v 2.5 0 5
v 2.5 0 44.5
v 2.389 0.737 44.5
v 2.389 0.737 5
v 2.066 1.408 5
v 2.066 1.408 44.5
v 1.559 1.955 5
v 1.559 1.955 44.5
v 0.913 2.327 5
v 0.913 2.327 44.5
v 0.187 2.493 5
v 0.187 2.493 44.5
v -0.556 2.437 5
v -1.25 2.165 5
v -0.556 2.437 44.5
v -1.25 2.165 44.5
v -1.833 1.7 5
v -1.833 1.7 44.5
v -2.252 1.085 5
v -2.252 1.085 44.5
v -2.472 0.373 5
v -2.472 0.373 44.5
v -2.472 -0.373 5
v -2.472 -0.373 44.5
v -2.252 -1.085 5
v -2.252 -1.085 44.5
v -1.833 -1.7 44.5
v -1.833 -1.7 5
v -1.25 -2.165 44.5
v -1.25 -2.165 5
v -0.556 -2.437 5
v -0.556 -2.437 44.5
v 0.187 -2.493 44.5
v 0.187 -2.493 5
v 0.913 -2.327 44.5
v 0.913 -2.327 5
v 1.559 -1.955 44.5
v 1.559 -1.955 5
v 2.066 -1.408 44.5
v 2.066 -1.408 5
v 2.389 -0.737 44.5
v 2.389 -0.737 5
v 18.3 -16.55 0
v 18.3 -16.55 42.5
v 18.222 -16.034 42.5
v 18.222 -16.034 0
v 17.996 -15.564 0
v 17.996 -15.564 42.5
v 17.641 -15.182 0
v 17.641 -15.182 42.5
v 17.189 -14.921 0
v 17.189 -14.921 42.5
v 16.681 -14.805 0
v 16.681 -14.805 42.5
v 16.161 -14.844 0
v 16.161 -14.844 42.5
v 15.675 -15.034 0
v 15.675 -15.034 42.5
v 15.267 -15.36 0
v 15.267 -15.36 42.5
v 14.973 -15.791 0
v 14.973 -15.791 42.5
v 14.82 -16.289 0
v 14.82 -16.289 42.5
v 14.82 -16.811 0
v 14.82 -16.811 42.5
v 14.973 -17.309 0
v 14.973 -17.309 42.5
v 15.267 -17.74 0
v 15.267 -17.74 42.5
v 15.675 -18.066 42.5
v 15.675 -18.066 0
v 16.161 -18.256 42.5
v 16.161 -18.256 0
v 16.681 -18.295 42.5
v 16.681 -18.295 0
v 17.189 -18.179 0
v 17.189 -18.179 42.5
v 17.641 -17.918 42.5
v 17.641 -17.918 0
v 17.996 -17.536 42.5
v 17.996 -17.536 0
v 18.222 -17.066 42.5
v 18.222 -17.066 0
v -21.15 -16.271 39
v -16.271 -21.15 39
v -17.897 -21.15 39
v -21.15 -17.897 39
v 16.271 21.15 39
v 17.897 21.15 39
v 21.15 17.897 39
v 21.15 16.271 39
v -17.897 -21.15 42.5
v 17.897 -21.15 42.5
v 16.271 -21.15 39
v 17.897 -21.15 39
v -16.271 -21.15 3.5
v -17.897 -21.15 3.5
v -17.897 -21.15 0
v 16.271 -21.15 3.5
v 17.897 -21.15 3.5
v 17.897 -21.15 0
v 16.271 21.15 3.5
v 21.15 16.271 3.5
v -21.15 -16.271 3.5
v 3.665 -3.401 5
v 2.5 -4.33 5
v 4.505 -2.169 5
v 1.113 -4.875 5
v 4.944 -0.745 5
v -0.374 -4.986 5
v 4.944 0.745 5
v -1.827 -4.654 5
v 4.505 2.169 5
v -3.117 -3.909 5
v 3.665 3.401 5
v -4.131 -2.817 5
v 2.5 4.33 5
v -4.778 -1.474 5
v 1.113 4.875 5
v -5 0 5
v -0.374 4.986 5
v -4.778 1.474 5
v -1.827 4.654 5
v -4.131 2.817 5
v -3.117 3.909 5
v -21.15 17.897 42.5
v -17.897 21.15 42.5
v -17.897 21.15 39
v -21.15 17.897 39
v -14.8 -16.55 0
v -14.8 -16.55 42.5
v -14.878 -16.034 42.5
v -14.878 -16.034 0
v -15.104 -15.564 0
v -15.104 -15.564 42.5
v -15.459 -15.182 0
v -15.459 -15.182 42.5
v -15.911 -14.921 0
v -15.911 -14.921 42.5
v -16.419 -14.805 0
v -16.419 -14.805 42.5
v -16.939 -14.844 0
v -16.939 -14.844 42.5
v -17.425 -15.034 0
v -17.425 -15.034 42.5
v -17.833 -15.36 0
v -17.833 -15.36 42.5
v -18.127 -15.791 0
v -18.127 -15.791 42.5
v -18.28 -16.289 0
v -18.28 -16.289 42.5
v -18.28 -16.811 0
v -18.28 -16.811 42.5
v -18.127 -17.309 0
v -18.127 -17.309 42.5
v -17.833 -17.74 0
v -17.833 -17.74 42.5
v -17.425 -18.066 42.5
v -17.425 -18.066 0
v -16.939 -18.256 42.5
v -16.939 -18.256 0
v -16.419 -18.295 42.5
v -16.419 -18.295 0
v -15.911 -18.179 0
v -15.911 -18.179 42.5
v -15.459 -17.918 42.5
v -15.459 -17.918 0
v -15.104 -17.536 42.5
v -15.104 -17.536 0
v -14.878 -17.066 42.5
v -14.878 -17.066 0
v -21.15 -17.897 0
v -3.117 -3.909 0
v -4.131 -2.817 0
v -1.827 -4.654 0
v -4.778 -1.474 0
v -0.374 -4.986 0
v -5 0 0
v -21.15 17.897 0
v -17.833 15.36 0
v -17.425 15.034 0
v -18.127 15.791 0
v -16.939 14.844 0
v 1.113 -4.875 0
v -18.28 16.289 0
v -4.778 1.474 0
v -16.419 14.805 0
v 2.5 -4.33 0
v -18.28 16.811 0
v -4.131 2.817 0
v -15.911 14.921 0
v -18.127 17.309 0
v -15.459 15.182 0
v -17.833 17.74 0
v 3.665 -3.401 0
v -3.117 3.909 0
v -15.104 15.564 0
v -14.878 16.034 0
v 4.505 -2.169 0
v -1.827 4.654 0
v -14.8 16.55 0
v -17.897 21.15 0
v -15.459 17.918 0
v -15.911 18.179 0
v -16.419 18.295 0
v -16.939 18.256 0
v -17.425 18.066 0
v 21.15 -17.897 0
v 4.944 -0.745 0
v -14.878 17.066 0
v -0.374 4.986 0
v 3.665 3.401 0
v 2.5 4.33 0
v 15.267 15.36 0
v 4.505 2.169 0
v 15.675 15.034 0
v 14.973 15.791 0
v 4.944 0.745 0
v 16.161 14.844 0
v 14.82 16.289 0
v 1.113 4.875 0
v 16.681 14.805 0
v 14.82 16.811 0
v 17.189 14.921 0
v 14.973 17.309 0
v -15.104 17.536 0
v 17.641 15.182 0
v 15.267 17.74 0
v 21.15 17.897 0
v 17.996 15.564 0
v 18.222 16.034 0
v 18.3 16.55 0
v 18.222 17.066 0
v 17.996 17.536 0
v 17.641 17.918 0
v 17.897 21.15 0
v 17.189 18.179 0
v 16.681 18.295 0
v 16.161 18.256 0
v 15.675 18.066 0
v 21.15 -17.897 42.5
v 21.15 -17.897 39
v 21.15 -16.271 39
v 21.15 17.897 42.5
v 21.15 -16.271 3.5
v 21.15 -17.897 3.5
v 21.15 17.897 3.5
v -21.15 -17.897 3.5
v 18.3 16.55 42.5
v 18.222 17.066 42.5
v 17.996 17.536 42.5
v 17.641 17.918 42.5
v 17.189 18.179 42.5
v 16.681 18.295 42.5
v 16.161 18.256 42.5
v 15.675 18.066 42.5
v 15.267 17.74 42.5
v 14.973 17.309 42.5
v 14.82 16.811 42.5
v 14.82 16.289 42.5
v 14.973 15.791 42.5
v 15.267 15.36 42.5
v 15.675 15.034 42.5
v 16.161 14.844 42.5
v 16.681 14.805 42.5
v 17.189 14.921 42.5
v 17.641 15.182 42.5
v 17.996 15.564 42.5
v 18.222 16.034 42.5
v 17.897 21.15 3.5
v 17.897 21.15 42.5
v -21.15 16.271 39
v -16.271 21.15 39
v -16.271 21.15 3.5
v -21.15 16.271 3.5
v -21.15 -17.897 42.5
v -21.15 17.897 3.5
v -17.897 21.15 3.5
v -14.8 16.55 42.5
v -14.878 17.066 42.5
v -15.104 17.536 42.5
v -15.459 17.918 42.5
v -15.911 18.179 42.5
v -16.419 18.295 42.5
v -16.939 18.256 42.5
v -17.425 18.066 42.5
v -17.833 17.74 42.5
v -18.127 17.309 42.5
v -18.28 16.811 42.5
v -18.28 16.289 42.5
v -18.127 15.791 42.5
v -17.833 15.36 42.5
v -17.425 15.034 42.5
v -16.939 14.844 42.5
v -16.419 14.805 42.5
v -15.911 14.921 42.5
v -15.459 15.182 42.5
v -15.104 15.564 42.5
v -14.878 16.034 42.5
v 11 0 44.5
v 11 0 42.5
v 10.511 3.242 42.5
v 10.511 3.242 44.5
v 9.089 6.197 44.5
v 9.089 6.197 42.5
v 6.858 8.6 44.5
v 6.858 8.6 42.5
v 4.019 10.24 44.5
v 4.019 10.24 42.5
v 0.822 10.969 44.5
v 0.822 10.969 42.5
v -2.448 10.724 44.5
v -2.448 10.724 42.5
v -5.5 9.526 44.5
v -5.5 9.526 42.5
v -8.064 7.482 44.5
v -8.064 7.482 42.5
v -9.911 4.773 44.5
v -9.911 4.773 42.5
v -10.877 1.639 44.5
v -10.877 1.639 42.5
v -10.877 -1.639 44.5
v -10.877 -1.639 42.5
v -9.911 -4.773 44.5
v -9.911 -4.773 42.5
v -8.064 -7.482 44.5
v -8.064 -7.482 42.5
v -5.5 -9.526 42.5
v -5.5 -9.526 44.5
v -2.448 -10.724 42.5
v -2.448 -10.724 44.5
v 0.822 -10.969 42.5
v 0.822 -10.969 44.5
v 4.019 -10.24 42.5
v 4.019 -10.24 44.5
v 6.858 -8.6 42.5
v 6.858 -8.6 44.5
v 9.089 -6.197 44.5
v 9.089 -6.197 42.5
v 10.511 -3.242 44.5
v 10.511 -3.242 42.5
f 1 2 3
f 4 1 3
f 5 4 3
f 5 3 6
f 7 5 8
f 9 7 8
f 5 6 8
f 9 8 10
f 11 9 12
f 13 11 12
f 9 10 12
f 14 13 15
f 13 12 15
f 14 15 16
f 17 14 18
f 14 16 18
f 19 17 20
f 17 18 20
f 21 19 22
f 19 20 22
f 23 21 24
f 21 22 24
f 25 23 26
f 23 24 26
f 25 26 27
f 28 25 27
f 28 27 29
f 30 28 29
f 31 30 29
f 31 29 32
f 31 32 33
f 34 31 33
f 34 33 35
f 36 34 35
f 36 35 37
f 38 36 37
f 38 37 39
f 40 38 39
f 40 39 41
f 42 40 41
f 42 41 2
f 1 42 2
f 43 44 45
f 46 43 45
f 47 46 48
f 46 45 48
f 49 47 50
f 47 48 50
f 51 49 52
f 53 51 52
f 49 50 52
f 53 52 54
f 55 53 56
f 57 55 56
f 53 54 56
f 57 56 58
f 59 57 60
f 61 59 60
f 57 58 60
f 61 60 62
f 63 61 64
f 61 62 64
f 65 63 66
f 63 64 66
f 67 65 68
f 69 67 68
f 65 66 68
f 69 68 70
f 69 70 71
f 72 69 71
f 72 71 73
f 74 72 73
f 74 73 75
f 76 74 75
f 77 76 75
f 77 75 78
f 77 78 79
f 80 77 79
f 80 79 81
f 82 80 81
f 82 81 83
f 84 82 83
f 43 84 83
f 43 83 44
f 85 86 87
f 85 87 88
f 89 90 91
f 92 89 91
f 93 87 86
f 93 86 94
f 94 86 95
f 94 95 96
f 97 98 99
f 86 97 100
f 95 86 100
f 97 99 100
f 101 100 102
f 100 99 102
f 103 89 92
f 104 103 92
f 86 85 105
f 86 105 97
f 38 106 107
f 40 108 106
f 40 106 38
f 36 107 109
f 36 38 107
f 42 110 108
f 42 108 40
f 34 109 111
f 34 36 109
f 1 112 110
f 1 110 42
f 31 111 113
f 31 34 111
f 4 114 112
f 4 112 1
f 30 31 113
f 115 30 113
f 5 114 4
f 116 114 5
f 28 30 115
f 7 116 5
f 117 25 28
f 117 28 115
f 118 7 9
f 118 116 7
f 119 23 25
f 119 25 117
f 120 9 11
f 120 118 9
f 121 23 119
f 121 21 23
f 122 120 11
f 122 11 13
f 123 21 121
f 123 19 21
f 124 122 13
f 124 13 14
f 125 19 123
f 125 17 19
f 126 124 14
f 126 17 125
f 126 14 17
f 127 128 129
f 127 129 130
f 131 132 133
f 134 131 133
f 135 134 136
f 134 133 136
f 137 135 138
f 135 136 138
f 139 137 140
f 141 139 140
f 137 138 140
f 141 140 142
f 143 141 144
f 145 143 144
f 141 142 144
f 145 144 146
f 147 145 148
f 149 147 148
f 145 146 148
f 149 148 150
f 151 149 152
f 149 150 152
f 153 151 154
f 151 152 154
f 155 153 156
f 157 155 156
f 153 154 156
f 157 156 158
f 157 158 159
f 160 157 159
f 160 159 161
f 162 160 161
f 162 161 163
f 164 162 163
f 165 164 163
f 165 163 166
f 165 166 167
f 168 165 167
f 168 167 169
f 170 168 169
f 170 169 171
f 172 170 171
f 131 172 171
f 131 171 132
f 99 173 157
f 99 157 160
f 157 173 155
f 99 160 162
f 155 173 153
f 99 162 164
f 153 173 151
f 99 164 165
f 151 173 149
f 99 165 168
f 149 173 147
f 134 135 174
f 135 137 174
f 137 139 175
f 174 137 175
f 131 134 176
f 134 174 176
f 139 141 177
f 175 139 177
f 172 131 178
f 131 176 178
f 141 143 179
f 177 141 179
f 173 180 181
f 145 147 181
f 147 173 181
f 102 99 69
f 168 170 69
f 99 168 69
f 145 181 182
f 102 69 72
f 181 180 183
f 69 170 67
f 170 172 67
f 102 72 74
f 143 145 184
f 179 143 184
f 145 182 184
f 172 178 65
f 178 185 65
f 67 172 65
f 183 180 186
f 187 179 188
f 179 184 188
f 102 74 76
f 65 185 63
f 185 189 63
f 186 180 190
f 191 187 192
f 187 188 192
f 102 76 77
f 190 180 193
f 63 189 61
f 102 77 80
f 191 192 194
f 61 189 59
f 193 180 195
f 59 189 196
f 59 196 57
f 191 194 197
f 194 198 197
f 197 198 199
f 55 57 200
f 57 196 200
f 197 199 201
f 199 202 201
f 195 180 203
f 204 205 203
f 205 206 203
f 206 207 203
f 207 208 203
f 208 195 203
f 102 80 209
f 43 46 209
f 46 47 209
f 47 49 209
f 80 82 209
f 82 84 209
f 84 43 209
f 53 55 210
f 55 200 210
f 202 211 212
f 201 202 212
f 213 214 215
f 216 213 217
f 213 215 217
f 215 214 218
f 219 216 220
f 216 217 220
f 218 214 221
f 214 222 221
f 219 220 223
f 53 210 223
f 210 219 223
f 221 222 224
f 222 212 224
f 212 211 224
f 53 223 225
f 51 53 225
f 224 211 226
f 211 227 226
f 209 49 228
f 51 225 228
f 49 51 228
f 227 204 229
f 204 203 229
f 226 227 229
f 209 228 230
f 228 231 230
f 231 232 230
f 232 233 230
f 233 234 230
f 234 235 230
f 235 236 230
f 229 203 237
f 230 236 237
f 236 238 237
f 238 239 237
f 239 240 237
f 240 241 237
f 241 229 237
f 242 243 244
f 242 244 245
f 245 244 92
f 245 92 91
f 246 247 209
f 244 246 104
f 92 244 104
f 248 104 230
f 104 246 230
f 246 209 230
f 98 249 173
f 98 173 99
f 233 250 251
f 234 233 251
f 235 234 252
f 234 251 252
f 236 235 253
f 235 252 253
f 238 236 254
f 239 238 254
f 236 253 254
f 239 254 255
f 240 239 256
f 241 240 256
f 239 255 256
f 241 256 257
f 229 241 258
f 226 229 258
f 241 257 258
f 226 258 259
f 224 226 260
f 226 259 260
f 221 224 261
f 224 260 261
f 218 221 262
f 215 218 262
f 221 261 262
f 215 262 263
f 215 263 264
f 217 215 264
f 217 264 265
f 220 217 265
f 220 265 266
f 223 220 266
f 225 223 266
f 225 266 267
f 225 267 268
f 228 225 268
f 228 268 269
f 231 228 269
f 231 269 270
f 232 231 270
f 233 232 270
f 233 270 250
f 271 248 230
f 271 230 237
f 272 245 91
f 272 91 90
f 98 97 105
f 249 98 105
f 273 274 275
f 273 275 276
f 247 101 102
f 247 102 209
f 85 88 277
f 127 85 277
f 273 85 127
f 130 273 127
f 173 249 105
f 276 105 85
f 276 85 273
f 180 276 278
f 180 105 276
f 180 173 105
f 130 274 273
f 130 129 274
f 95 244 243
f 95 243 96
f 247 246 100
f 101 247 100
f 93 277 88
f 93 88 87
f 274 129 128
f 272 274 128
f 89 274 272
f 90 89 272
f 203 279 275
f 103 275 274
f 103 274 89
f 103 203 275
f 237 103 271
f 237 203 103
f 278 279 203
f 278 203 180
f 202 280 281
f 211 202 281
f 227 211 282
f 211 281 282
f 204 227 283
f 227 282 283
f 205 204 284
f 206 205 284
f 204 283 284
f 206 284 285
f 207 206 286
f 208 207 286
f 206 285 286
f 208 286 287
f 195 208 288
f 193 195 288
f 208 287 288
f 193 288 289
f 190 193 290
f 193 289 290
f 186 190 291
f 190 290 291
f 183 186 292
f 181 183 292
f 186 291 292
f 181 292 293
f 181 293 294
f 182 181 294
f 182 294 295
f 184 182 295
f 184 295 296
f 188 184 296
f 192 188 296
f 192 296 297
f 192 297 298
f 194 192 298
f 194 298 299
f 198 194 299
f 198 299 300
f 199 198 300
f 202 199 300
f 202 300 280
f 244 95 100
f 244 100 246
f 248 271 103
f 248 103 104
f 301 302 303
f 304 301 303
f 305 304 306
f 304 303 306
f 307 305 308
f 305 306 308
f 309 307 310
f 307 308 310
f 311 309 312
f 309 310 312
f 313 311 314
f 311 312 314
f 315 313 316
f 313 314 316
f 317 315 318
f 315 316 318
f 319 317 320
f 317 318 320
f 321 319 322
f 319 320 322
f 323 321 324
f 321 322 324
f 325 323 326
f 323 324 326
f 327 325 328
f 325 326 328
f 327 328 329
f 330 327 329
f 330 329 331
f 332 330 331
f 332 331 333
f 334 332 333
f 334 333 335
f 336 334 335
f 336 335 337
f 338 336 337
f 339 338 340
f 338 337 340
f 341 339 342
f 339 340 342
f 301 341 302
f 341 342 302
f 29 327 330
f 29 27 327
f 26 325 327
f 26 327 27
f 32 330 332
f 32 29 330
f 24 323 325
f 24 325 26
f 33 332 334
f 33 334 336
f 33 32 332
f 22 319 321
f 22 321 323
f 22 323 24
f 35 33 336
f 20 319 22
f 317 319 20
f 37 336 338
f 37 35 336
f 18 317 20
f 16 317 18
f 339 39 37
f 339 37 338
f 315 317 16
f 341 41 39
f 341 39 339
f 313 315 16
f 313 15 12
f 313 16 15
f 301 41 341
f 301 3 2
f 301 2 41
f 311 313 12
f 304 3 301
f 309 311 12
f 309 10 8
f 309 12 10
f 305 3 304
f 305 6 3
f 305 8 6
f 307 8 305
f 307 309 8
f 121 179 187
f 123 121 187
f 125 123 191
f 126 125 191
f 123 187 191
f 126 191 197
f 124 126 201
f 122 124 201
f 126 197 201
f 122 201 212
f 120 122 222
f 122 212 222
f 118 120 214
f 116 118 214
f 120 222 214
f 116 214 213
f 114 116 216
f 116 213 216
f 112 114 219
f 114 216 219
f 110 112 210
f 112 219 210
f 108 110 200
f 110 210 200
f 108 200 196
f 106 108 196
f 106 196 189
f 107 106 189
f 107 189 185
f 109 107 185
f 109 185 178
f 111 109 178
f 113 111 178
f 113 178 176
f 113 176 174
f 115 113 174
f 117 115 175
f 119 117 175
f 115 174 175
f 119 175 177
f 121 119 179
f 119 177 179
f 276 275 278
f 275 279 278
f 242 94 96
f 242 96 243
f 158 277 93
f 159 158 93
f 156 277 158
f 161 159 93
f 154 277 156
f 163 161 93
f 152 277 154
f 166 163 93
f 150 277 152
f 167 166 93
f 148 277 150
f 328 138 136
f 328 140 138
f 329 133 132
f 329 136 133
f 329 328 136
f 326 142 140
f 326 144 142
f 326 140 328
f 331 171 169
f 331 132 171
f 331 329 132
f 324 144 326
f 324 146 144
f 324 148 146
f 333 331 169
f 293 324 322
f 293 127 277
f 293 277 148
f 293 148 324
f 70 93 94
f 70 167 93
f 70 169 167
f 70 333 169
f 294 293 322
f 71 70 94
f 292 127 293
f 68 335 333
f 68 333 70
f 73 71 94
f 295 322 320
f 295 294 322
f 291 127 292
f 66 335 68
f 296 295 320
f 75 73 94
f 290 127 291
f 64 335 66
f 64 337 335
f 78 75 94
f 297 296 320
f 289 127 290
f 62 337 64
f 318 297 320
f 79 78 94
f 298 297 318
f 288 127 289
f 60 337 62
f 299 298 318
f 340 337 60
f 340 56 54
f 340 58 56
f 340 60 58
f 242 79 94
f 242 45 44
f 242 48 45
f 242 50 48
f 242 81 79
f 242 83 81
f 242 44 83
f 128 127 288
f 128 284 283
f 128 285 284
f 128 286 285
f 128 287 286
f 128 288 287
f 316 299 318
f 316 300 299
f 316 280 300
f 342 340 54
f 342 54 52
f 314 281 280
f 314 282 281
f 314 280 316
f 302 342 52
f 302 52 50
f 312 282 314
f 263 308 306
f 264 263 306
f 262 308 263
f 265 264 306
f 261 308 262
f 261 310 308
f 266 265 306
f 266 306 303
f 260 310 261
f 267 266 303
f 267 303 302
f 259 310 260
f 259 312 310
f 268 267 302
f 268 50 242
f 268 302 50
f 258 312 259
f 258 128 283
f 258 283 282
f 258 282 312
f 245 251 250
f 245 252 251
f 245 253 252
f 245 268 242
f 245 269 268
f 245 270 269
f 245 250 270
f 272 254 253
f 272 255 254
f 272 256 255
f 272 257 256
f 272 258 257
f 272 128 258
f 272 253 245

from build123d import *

# Parameters (mm, degrees)
SKETCH1_W                = 42.3
SKETCH1_H                = 42.3
BOSS_EXTRUDE1_DEPTH      = 42.5
SKETCH2_R                = 11
BOSS_EXTRUDE2_DEPTH      = 2
SKETCH3_R                = 1.75
CUT_EXTRUDE1_DEPTH       = 43.5
CUT_EXTRUDE2_DEPTH       = 43.5
SKETCH5_R                = 2.5
CUT_EXTRUDE3_DEPTH       = 45.5
SKETCH6_R                = 2.5
BOSS_EXTRUDE3_DEPTH      = 22
BOSS_EXTRUDE3_DEPTH_BACK = 47.5
SKETCH7_R                = 5
SKETCH7_R_2              = 2.5
CUT_EXTRUDE4_DEPTH       = 5
CUT_EXTRUDE5_DEPTH       = 20
SKETCH9_R                = 2.5
CUT_EXTRUDE6_DEPTH       = 70.5
CUT_EXTRUDE7_DEPTH       = 35.5


with BuildPart() as part:
    # Sketch1 → Boss-Extrude1 (new body)
    with BuildSketch(Plane.XY):
        Rectangle(SKETCH1_W, SKETCH1_H)
    extrude(amount=BOSS_EXTRUDE1_DEPTH)

    # Sketch2 → Boss-Extrude2 (add)
    with BuildSketch(Plane.XY.offset(42.5)):
        Circle(SKETCH2_R)
    extrude(amount=BOSS_EXTRUDE2_DEPTH)

    # Sketch3 → Cut-Extrude1 (cut, through all)
    with BuildSketch(Plane.XY.offset(42.5)):
        with Locations((-16.55, 16.55)):
            Circle(SKETCH3_R)
        with Locations((16.55, 16.55)):
            Circle(SKETCH3_R)
        with Locations((16.55, -16.55)):
            Circle(SKETCH3_R)
        with Locations((-16.55, -16.55)):
            Circle(SKETCH3_R)
    extrude(amount=-CUT_EXTRUDE1_DEPTH, mode=Mode.SUBTRACT)

    # Sketch4 → Cut-Extrude2 (cut, through all)
    with BuildSketch(Plane.XY.offset(42.5)):
        Polygon((-21.15, 17.897308807), (-21.15, 21.15), (-17.897308807, 21.15), align=None)
        Polygon((17.897308807, 21.15), (21.15, 21.15), (21.15, 17.897308807), align=None)
        Polygon((21.15, -17.897308807), (21.15, -21.15), (17.897308807, -21.15), align=None)
        Polygon((-17.897308807, -21.15), (-21.15, -21.15), (-21.15, -17.897308807), align=None)
    extrude(amount=-CUT_EXTRUDE2_DEPTH, mode=Mode.SUBTRACT)

    # Sketch5 → Cut-Extrude3 (cut, through all)
    with BuildSketch(Plane.XY.offset(44.5)):
        Circle(SKETCH5_R)
    extrude(amount=-CUT_EXTRUDE3_DEPTH, mode=Mode.SUBTRACT)

    # Sketch6 → Boss-Extrude3 (add, two sides)
    with BuildSketch(Plane.XY.offset(44.5)) as boss_extrude3_sk:
        Circle(SKETCH6_R)
    extrude(amount=BOSS_EXTRUDE3_DEPTH)
    extrude(boss_extrude3_sk.sketch, amount=-BOSS_EXTRUDE3_DEPTH_BACK)

    # Sketch7 → Cut-Extrude4 (cut)
    with BuildSketch(Plane(origin=(0, 0, 0), x_dir=(-1, 0, 0), z_dir=(0, 0, -1))):
        Circle(SKETCH7_R)
        Circle(SKETCH7_R_2, mode=Mode.SUBTRACT)
    extrude(amount=-CUT_EXTRUDE4_DEPTH, mode=Mode.SUBTRACT)

    # Sketch8 → Cut-Extrude5 (cut)
    with BuildSketch(Plane.XY.offset(66.5)):
        with BuildLine():
            Line((2.5, 0), (0, 2.5))
            ThreePointArc((0, 2.5), (1.767766953, 1.767766953), (2.5, 0))
        make_face()
    extrude(amount=-CUT_EXTRUDE5_DEPTH, mode=Mode.SUBTRACT)

    # Sketch9 → Cut-Extrude6 (cut, through all)
    with BuildSketch(Plane.XY.offset(66.5)):
        Circle(SKETCH9_R)
    extrude(amount=-CUT_EXTRUDE6_DEPTH, mode=Mode.SUBTRACT)

    # Sketch10 → Cut-Extrude7 (cut)
    with BuildSketch(Plane.XY.offset(3.5)):
        Polygon((25, -25), (12.42096321, -25), (25, -12.42096321), align=None)
        Polygon((25, 25), (12.42096321, 25), (25, 12.42096321), align=None)
        Polygon((-25, -25), (-25, -12.42096321), (-12.42096321, -25), align=None)
        Polygon((-25, 12.42096321), (-25, 25), (-12.42096321, 25), align=None)
    extrude(amount=CUT_EXTRUDE7_DEPTH, mode=Mode.SUBTRACT)


solid = part.part
